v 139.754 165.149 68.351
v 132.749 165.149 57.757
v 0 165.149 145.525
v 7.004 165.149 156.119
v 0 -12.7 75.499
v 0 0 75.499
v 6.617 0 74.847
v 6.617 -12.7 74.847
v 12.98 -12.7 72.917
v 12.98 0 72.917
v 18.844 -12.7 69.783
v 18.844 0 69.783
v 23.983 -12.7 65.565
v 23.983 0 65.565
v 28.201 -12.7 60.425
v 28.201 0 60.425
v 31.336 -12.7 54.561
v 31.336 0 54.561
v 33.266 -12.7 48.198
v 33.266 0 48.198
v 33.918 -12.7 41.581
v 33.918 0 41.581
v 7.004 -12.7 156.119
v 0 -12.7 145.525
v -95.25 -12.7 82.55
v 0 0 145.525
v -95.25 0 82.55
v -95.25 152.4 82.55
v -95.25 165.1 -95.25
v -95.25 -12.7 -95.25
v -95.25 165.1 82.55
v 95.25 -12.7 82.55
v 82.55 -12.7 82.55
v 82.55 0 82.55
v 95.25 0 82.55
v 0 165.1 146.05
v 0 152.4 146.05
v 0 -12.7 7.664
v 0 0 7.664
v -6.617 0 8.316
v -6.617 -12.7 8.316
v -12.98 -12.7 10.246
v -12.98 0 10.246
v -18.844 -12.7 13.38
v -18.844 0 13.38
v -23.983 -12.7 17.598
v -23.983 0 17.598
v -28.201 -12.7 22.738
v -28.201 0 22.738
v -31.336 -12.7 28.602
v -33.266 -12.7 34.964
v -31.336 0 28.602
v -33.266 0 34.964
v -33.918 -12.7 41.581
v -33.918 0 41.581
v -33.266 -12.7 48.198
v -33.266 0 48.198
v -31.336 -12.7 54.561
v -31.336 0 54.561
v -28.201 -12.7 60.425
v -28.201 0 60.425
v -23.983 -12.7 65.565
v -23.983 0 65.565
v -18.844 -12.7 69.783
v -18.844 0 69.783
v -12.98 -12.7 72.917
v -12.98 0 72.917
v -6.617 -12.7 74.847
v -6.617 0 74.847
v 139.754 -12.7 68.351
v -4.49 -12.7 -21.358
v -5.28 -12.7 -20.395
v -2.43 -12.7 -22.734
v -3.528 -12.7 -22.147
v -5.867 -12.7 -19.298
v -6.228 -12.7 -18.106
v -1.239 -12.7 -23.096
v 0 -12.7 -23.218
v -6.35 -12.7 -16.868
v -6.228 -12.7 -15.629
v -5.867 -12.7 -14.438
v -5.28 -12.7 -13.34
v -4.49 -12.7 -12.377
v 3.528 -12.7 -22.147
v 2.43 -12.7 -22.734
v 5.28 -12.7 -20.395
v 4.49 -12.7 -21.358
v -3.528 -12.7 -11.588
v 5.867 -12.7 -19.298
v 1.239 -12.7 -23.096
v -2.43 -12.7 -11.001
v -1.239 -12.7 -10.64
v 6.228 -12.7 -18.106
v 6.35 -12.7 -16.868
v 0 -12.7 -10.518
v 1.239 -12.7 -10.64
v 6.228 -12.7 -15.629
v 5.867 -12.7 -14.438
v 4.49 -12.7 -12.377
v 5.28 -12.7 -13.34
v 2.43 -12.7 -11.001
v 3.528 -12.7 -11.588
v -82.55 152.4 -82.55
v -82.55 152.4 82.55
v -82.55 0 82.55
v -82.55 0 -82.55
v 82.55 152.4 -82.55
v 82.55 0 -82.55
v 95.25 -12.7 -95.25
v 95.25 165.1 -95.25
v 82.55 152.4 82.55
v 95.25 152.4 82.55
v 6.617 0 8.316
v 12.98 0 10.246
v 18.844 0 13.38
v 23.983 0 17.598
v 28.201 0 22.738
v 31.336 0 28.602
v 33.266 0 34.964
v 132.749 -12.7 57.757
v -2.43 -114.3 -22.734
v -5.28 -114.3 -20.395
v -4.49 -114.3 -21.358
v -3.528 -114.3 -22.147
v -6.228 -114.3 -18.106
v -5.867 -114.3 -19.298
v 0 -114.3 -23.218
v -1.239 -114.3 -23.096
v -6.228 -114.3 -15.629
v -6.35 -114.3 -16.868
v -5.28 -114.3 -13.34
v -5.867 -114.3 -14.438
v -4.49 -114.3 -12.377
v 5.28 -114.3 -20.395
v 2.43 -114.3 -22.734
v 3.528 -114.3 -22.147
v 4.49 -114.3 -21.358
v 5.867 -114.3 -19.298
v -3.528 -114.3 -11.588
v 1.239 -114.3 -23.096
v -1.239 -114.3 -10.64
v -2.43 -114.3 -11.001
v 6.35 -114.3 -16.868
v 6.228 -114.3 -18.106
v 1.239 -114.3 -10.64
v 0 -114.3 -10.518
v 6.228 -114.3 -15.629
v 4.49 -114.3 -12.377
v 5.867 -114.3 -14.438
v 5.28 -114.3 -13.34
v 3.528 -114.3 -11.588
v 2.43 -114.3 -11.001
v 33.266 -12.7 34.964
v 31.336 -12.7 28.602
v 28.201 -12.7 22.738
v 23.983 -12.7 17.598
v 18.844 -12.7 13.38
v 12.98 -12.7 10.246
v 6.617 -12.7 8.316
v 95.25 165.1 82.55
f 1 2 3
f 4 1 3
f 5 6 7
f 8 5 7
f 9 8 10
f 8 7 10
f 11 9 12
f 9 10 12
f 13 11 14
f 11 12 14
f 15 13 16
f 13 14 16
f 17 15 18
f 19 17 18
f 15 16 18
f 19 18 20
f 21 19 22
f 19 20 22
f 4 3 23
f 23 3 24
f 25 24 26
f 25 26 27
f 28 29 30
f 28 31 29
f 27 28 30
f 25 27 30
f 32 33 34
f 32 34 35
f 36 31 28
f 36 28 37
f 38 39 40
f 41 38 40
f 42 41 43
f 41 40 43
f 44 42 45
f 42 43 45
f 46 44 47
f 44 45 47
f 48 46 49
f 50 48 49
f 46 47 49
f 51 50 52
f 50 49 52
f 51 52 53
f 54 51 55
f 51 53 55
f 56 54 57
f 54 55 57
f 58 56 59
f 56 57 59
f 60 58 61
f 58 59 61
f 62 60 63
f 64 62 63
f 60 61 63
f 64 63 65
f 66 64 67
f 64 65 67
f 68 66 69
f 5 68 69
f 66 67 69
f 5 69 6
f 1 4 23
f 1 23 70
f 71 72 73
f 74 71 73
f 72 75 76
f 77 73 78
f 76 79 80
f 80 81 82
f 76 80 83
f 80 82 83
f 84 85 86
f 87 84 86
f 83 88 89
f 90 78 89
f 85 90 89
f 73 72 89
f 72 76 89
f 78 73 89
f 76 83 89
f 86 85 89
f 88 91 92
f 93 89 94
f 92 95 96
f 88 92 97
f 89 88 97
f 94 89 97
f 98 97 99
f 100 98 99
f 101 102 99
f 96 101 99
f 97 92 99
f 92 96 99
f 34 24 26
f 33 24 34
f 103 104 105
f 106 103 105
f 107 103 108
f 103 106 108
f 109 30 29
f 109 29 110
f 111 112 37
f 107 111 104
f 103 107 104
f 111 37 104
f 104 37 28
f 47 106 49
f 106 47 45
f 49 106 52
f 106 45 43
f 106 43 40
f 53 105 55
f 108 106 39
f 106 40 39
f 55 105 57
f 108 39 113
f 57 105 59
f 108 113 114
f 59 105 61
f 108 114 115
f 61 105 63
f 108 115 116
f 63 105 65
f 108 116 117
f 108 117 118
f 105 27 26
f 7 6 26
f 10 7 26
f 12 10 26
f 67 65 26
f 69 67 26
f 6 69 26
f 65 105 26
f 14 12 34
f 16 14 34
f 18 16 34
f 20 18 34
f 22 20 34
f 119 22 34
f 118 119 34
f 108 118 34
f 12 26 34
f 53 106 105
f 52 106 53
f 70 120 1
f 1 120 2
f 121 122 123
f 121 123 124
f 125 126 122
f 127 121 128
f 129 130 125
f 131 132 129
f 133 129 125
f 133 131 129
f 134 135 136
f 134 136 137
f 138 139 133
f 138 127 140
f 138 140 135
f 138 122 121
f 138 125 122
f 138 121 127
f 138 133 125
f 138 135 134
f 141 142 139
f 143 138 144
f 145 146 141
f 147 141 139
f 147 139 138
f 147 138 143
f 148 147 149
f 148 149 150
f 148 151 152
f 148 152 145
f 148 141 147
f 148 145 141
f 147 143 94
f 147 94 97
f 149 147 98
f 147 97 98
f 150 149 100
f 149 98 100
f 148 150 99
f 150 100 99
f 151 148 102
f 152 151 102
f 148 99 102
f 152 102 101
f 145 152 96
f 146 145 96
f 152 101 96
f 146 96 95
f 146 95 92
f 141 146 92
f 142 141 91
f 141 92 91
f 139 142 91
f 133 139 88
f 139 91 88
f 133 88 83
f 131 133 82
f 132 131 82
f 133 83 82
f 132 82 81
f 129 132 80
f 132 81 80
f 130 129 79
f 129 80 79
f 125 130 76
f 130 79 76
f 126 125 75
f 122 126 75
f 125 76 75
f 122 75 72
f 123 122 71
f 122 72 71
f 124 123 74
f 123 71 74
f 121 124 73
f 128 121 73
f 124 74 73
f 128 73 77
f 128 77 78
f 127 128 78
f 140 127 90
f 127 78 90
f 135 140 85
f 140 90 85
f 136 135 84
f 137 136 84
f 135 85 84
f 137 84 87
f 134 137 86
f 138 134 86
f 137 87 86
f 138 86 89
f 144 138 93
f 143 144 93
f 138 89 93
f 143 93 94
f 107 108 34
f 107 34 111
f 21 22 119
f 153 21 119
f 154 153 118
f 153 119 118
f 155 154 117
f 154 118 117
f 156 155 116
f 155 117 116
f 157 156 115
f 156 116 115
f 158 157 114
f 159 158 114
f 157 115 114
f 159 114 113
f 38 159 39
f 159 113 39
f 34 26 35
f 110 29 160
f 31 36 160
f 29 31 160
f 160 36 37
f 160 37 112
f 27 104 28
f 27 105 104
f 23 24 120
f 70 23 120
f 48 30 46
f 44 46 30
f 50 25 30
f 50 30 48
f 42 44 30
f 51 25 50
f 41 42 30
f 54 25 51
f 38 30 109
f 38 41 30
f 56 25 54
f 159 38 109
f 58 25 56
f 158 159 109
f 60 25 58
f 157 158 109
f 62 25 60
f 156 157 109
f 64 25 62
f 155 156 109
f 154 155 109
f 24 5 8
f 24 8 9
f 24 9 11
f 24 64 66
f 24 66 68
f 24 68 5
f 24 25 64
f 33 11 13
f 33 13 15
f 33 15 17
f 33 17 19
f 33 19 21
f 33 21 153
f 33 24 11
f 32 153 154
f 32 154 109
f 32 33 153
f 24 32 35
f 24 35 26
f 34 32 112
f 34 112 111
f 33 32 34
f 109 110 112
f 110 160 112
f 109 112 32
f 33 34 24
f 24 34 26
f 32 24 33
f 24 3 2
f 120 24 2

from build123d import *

# Parameters (mm, degrees)
F0_R      = 12.6242365168
F1_DEPTH  = 12.7
F2_R      = 6.35
F3_DEPTH  = 101.6
F4_W      = 165.1
F4_H      = 165.1
F5_DEPTH  = 12.7
F6_W      = 165.1
F6_H      = 165.1
F7_DEPTH  = 12.7
F8_W      = 190.5
F8_H      = 165.1
F9_DEPTH  = 12.7
F11_DEPTH = 12.7
F13_DEPTH = 12.7
F15_DEPTH = 12.7
F17_DEPTH = 12.7
F18_W     = 190.5
F18_H     = 177.8
F19_DEPTH = 12.7


with BuildPart() as f1:
    # F0 (on Front) → F1 (new body)
    with BuildSketch(Plane.XZ):
        Polygon((0, 82.55), (-82.55, 82.55), (-82.55, -82.55), (82.55, -82.55), (82.55, 82.55), align=None)
        with Locations((0, -25.6478693336)):
            Circle(F0_R, mode=Mode.SUBTRACT)
        with BuildLine():
            ThreePointArc((0, 7.6638790456), (-33.917569122, 41.5814481676), (0, 75.4990172895))
            ThreePointArc((0, 75.4990172895), (23.9833431275, 65.5647912951), (33.917569122, 41.5814481676))
            ThreePointArc((33.917569122, 41.5814481676), (23.9833431275, 17.59810504), (0, 7.6638790456))
        make_face(mode=Mode.SUBTRACT)
        Polygon((0, 145.5251276493), (-82.55, 82.55), (0, 82.55), align=None)
        Polygon((0, 145.5251276493), (0, 82.55), (82.55, 82.55), align=None)
        with Locations((0, -25.6478693336)):
            Circle(F0_R)
    extrude(amount=F1_DEPTH)

    # F4 (on face) → F5 (join)
    with BuildSketch(Plane.YZ.offset(82.55)):
        with Locations((69.85, 0)):
            Rectangle(F4_W, F4_H)
    extrude(amount=F5_DEPTH)

    # F6 (on face) → F7 (join)
    with BuildSketch(Plane(origin=(-82.55, 0, 0), x_dir=(0, -1, 0), z_dir=(-1, 0, 0))):
        with Locations((-69.85, 0)):
            Rectangle(F6_W, F6_H)
    extrude(amount=F7_DEPTH)

    # F8 (on face) → F9 (join)
    with BuildSketch(Plane(origin=(0, 152.4, 0), x_dir=(-1, 0, 0), z_dir=(0, 1, 0))):
        Rectangle(F8_W, F8_H)
    extrude(amount=F9_DEPTH)

    # F12 (on face) → F13 (join)
    with BuildSketch(Plane.XZ.offset(12.7)):
        Polygon((-82.55, 82.55), (0, 145.5251276493), (-95.25, 82.55), align=None)
    extrude(amount=-F13_DEPTH)

    # F14 (on face) → F15 (join)
    with BuildSketch(Plane(origin=(0, 165.1, 0), x_dir=(-1, 0, 0), z_dir=(0, 1, 0))):
        Polygon((-95.25, 82.55), (0, 82.55), (0, 146.05), align=None)
        Polygon((0, 146.05), (0, 82.55), (95.25, 82.55), align=None)
    extrude(amount=-F15_DEPTH)

    # F18 (on face) → F19 (join)
    with BuildSketch(Plane(origin=(0, 0, -82.55), x_dir=(1, 0, 0), z_dir=(0, 0, -1))):
        with Locations((0, -76.2)):
            Rectangle(F18_W, F18_H)
    extrude(amount=F19_DEPTH)


with BuildPart() as f3:
    # F2 (on face) → F3 (new body)
    with BuildSketch(Plane.XZ.offset(12.7)):
        with Locations((0, -16.8675573403)):
            Circle(F2_R)
    extrude(amount=F3_DEPTH)


with BuildPart() as f11:
    # F10 (on face) → F11 (new body)
    with BuildSketch(Plane.XZ.offset(12.7)):
        Polygon((95.25, 82.55), (0, 145.5251276493), (82.55, 82.55), align=None)
    extrude(amount=-F11_DEPTH)


with BuildPart() as f17:
    # F16 (on face) → F17 (new body)
    with BuildSketch(Plane(origin=(66.9494103821, 0, 101.2611101705), x_dir=(0.8341657377, 0, -0.5515138458), z_dir=(0.5515138458, 0, 0.8341657377))):
        Polygon((-80.2591228078, 165.1490181684), (-80.2591228078, -12.7), (33.9268185442, -12.7), (78.8811668754, -12.7), (78.8811668754, 165.1490181684), (33.4978550673, 165.1490181684), align=None)
    extrude(amount=F17_DEPTH)


solid = Compound([f1.part, f3.part, f11.part, f17.part])
